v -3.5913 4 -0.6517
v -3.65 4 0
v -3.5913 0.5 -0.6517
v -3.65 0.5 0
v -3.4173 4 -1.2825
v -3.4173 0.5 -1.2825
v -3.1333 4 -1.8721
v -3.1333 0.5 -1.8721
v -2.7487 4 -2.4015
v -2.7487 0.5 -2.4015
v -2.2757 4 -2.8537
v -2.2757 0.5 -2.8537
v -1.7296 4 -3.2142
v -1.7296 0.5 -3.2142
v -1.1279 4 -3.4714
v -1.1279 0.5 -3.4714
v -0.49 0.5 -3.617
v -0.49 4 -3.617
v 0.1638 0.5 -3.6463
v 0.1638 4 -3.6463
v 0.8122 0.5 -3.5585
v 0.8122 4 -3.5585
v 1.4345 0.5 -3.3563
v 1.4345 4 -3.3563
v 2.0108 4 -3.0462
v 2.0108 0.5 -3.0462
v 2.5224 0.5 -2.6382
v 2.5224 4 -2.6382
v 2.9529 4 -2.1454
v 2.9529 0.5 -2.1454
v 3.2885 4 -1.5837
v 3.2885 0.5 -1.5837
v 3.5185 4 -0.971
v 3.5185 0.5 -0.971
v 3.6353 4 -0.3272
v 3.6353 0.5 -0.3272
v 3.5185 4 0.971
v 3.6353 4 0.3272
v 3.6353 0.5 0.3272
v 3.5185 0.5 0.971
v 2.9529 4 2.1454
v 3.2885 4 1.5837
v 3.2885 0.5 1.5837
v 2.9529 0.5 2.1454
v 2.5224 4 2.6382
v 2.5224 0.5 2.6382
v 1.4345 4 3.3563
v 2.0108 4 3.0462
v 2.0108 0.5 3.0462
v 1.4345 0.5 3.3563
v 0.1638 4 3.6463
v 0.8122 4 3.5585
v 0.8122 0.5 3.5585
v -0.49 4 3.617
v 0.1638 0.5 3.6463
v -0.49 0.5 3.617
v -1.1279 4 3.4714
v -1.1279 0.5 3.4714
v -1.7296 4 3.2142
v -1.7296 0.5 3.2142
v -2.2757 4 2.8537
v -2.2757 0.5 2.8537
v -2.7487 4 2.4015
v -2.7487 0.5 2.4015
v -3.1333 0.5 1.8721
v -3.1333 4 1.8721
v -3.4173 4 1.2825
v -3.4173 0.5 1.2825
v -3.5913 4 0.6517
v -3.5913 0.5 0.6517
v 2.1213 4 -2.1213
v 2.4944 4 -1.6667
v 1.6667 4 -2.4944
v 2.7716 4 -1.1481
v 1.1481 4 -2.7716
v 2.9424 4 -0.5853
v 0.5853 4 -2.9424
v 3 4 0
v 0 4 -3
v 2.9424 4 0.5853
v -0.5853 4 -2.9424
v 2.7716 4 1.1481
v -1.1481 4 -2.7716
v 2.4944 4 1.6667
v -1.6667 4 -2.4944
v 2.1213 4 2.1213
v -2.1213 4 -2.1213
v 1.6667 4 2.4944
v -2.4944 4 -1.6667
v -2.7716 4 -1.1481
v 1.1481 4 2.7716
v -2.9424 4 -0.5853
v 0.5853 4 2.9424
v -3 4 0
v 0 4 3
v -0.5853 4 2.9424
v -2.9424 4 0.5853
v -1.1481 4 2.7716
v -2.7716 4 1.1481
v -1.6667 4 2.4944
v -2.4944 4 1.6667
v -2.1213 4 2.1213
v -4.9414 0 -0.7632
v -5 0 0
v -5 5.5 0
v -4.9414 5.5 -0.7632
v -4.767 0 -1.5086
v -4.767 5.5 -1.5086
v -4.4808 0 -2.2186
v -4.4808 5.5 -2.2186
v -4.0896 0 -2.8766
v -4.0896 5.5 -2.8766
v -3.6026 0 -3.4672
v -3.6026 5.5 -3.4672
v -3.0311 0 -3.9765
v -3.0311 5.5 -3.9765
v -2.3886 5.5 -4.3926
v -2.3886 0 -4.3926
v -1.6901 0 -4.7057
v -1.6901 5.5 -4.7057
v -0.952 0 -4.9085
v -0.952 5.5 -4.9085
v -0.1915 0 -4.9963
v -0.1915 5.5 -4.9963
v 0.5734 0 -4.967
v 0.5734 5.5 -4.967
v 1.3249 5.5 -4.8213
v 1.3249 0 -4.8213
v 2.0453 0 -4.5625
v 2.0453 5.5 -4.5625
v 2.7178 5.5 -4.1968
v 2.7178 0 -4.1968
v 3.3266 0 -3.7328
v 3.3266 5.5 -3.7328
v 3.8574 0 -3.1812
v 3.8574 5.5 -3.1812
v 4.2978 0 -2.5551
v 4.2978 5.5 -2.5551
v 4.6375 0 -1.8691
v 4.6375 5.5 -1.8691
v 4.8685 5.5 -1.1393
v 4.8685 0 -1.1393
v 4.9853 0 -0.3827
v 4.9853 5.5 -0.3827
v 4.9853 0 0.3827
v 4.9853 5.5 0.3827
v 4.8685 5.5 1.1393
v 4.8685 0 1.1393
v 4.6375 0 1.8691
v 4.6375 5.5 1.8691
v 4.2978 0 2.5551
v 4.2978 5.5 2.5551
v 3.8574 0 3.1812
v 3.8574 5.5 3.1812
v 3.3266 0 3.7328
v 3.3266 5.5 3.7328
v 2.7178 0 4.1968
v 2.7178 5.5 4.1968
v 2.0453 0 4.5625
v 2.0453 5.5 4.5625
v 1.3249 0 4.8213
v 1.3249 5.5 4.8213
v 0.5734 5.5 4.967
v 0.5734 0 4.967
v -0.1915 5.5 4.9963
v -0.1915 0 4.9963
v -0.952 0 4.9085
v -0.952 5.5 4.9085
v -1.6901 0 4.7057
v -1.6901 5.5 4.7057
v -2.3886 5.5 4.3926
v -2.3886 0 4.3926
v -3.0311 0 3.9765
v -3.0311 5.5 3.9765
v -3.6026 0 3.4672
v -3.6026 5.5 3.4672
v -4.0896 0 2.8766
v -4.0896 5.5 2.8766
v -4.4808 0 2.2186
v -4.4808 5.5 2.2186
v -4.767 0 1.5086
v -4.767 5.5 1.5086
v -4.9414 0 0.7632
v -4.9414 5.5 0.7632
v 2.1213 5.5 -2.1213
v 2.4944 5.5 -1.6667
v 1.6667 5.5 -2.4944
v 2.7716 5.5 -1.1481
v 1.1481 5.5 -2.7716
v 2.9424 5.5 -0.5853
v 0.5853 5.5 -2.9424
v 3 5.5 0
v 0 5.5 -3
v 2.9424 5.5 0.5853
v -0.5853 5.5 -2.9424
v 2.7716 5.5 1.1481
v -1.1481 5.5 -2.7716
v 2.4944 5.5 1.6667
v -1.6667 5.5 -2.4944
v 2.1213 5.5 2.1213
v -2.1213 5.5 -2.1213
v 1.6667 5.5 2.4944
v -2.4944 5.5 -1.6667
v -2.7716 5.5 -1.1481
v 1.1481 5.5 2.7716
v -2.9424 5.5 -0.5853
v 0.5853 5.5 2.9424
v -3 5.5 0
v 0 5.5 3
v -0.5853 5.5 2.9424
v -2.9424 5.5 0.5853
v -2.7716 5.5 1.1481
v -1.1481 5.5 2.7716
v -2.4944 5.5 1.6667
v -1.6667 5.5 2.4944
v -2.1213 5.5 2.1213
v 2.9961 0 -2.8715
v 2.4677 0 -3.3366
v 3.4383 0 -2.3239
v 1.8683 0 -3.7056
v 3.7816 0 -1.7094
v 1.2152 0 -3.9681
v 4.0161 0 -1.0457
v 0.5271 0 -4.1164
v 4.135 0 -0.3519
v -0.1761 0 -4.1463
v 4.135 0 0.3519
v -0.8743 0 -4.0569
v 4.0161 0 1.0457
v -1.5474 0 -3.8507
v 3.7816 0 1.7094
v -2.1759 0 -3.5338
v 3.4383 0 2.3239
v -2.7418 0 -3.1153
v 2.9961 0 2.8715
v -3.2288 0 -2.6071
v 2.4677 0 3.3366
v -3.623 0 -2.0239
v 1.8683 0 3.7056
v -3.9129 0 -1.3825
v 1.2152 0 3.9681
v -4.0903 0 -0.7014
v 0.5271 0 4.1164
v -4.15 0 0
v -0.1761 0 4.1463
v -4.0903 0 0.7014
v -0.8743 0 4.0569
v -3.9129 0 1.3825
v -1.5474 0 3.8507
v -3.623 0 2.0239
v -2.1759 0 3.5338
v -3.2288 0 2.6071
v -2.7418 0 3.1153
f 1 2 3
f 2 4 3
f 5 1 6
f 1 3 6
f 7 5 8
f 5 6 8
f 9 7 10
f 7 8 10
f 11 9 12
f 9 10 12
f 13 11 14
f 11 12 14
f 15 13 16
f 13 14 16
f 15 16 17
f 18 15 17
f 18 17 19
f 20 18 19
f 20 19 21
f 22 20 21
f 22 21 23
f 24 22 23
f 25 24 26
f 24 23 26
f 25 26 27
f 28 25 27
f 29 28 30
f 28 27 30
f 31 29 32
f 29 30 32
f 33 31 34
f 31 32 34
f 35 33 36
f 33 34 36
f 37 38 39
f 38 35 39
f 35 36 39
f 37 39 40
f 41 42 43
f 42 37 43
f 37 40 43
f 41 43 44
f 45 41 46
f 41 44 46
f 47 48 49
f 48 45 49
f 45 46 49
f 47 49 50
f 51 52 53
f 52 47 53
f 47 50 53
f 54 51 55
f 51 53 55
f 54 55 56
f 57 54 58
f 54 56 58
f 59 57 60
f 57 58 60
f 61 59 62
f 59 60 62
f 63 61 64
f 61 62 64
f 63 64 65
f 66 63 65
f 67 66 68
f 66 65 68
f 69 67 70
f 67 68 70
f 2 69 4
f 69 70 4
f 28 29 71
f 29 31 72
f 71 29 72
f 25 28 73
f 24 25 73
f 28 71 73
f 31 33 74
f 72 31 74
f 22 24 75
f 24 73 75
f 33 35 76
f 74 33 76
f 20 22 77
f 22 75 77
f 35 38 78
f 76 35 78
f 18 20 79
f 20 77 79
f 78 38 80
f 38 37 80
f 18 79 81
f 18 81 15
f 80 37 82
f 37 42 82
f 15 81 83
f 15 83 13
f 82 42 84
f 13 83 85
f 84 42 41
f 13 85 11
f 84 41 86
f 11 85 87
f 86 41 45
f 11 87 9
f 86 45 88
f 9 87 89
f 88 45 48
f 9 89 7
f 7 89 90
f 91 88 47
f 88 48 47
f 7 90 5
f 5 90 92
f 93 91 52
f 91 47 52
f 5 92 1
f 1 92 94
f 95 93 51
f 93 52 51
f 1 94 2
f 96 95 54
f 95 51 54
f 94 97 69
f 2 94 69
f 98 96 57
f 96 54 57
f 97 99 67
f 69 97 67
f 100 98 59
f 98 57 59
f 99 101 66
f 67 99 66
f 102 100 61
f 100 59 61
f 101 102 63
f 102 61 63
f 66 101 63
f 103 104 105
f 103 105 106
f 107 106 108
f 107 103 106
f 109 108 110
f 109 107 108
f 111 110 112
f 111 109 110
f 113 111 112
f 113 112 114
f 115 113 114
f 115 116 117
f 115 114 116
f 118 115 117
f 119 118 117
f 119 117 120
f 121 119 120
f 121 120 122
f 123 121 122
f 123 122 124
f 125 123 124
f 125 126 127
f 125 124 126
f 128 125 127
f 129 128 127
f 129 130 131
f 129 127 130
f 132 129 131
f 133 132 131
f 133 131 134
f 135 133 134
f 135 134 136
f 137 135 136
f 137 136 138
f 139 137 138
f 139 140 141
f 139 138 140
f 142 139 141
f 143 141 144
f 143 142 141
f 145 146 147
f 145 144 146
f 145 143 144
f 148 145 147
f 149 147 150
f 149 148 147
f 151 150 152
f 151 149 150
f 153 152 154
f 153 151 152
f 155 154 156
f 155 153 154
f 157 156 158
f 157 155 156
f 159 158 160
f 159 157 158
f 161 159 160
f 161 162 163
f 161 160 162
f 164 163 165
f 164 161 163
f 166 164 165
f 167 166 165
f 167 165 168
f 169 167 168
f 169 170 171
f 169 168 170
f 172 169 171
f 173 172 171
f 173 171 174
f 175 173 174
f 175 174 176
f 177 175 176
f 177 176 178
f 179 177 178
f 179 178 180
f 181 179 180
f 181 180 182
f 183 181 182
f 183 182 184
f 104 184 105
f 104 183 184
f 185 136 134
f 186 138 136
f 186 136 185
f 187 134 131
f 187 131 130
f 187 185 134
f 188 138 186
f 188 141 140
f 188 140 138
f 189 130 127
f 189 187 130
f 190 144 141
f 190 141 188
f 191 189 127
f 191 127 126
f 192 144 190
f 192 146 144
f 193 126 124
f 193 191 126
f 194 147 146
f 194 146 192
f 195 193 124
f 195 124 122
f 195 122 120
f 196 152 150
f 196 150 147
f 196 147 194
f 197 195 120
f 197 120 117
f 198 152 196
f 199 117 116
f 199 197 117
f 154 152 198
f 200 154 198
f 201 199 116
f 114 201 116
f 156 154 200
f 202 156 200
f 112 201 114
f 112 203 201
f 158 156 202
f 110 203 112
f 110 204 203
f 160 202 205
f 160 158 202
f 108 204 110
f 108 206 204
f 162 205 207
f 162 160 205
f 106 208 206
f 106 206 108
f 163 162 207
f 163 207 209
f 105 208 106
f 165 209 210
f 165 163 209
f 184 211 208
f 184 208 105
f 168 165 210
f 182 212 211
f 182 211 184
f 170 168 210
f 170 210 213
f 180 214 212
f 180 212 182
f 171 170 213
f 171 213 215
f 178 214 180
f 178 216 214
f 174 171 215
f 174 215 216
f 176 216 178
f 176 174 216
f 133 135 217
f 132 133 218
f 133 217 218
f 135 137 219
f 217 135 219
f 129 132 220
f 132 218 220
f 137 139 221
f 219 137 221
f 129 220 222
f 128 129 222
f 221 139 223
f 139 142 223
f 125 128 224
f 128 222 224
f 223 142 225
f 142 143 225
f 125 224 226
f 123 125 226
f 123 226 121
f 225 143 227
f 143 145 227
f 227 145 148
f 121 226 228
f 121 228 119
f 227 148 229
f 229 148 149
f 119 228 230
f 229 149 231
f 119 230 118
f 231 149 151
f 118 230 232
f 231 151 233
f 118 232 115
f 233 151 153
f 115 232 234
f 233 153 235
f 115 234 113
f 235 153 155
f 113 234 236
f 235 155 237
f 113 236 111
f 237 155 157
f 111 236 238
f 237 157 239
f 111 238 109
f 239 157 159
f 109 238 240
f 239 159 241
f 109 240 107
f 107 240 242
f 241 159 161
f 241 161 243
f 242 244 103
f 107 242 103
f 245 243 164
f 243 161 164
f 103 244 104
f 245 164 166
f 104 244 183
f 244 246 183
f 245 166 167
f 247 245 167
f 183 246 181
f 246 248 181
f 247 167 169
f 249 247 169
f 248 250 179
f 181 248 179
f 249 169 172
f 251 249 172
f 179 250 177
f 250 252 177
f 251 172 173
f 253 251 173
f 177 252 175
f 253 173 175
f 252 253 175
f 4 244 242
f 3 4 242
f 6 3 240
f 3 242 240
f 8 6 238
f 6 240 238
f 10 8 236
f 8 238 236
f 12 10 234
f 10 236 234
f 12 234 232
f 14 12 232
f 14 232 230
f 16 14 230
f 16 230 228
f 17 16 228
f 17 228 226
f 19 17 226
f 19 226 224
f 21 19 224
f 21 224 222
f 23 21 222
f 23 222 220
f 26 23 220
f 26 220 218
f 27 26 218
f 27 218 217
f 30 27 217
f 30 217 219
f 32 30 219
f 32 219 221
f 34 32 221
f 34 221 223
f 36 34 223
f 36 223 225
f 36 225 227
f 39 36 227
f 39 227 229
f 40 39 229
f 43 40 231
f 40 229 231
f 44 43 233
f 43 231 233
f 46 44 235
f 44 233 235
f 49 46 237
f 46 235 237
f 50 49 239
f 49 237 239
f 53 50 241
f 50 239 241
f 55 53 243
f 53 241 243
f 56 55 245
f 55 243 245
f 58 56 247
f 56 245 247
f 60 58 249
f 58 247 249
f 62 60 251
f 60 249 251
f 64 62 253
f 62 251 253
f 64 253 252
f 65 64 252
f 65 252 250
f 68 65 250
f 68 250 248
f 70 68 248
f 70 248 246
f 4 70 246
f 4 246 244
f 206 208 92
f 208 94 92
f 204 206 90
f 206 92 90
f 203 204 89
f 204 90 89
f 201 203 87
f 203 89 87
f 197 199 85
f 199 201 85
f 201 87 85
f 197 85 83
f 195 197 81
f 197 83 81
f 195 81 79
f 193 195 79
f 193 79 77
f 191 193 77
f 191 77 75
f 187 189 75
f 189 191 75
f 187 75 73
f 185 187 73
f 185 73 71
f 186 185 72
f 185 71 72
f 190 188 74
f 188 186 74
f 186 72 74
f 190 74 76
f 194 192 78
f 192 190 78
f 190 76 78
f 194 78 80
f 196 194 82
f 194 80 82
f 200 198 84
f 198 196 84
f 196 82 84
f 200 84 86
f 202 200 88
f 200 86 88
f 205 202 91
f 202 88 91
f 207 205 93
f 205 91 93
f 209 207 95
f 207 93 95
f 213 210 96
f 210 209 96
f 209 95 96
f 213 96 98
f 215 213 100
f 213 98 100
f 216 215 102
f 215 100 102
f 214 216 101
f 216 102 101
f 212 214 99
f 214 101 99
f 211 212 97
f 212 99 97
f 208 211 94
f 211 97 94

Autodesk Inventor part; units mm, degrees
ref_plane "YZ Plane" through (0, 0, 0) normal (1, 0, 0) x (0, 1, 0)
ref_plane "XZ Plane" through (0, 0, 0) normal (0, 1, 0) x (-1, 0, 0)
ref_plane "XY Plane" through (0, 0, 0) normal (0, 0, 1) x (1, 0, 0)
sketch "Sketch1" plane through (0, 0, 0) normal (0, 1, 0) x (-1, 0, 0)
  circle A0 centre (0, 0) radius 3
  circle A1 centre (0, 0) radius 5
  circle A2 centre (0, 0) radius 3.65
  dimension "d0" = 6
  dimension "d1" = 10
  dimension "d2" = 7.3
extrude "Extrusion1" add sketch "Sketch1" along normal blind 4 contours A1
extrude "Extrusion2" add sketch "Sketch1" along normal blind 1.5 from surface at 4 contours A1 | A2
chamfer "Chamfer1" distance 0.5 angle 45 1 edges at (3.65, 0, 0)
properties part number "TransmissionBeltTensionerRoller"
